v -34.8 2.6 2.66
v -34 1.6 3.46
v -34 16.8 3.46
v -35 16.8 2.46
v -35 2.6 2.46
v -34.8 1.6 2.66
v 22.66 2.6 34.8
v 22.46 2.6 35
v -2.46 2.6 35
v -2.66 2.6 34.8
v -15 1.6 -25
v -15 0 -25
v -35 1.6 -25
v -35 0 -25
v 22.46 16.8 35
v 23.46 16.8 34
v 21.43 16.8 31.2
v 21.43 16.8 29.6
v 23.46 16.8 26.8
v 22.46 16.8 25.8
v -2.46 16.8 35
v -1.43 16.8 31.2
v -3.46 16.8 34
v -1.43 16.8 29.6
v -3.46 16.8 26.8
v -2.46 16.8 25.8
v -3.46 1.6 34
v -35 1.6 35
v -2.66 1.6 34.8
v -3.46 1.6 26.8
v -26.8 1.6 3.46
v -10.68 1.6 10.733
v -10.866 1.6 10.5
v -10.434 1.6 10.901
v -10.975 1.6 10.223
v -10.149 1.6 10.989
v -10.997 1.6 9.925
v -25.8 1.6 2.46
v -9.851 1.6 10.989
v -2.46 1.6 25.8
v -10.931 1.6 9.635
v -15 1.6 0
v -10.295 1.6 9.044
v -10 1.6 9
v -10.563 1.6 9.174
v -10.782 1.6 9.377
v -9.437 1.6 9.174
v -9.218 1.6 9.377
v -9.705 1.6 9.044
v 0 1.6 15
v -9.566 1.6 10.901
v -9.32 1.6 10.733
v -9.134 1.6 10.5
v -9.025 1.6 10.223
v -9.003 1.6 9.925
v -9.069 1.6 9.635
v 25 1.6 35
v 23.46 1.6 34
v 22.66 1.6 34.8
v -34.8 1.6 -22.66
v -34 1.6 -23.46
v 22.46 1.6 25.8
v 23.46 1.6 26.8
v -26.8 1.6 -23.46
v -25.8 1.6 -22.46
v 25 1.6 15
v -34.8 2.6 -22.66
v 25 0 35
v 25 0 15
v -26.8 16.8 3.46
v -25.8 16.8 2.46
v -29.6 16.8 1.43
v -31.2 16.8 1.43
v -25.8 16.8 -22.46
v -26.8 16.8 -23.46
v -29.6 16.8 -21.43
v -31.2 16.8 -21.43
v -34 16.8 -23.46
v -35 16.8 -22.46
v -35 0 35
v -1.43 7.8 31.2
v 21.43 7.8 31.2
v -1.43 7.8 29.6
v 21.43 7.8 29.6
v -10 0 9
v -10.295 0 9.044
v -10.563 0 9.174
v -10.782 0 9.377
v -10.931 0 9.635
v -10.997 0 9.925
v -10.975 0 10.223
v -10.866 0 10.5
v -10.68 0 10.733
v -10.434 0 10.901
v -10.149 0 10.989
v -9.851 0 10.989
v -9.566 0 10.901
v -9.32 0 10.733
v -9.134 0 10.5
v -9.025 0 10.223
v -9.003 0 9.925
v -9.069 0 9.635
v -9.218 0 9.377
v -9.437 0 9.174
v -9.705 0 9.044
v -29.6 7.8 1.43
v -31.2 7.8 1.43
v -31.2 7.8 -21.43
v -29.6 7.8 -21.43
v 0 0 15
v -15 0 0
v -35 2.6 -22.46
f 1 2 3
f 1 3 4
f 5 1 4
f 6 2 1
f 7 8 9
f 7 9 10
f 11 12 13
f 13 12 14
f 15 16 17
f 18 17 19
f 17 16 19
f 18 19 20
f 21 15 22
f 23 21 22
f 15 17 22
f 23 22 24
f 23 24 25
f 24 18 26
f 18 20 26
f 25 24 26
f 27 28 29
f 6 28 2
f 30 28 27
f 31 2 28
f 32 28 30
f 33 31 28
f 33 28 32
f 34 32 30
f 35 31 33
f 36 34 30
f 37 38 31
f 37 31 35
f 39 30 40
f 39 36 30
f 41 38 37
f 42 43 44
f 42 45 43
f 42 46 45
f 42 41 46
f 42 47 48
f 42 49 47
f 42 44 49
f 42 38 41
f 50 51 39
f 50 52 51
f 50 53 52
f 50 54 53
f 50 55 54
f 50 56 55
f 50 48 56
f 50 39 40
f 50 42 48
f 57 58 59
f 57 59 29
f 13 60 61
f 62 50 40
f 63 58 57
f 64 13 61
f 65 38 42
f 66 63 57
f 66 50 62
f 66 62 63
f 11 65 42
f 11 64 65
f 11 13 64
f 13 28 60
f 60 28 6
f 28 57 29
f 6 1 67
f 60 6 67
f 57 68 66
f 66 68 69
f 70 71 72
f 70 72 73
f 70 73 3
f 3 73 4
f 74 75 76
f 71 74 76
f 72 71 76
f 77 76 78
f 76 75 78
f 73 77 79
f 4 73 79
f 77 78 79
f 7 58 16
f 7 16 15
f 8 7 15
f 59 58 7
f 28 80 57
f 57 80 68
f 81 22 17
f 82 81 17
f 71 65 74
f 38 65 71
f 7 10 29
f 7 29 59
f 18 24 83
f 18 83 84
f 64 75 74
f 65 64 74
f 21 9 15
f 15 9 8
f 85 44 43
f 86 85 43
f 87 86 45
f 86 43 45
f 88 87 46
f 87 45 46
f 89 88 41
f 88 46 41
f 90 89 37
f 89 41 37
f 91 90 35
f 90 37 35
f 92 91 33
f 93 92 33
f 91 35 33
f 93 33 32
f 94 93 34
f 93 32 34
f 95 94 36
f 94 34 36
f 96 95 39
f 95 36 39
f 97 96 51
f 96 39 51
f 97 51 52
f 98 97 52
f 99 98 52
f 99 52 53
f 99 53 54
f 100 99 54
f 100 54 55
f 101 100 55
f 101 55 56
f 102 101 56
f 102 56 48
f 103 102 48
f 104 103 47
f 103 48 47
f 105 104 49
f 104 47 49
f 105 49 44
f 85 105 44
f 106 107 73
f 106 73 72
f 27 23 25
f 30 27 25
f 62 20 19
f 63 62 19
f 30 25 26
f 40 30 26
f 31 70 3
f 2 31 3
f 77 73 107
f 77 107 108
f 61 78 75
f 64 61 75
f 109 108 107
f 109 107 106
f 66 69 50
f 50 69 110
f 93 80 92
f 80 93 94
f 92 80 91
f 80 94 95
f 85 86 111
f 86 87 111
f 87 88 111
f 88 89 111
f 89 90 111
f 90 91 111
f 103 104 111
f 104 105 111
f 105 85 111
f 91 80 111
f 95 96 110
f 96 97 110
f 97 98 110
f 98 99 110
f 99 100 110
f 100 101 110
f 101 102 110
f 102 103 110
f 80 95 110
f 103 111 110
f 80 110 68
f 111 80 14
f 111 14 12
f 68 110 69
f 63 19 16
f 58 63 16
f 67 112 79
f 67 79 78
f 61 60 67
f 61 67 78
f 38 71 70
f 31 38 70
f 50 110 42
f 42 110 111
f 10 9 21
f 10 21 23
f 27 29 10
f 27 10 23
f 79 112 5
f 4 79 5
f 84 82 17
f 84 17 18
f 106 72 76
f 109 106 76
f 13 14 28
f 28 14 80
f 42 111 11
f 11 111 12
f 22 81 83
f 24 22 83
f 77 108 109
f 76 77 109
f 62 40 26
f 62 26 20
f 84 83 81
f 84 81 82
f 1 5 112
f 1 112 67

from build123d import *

# Parameters (mm, degrees)
EXTRUDE_1_DEPTH     = 1.6
EXTRUDE_START       = 1.6
EXTRUDE_2_DEPTH     = 15.2
CUT_EXTRUDE_START   = 35
SKETCH_5_W          = 26.92
SKETCH_5_H          = 1
CUT_EXTRUDE_2_DEPTH = 0.2
CUT_EXTRUDE_START_2 = -35
SKETCH_6_W          = 26.92
SKETCH_6_H          = 1
CUT_EXTRUDE_3_DEPTH = 0.2
CUT_EXTRUDE_START_3 = 16.8
SKETCH_7_W          = 1.6
SKETCH_7_H          = 22.86
SKETCH_7_W_2        = 22.86
SKETCH_7_H_2        = 1.6
CUT_EXTRUDE_4_DEPTH = 9
CUT_EXTRUDE_START_4 = 1.6
SKETCH_8_R          = 1
CUT_EXTRUDE_5_DEPTH = 1.6


with BuildPart() as part:
    # 草图2 → 凸台-拉伸1 (new body)
    with BuildSketch(Plane(origin=(0, 0, 0), x_dir=(1, 0, 0), z_dir=(0, 1, 0))):
        Polygon((-15, 0), (-15, 25), (-35, 25), (-35, 0), (-35, -35), (0, -35), (25, -35), (25, -15), (0, -15), align=None)
    extrude(amount=EXTRUDE_1_DEPTH)

    # 草图3 → 凸台-拉伸2 (add)
    with BuildSketch(Plane(origin=(0, 0, 0), x_dir=(1, 0, 0), z_dir=(0, 1, 0)).offset(EXTRUDE_START)):
        Polygon((-34, -3.46), (-35, -2.46), (-35, 22.46), (-34, 23.46), (-26.8, 23.46), (-25.8, 22.46), (-25.8, -2.46), (-26.8, -3.46), align=None)
        Polygon((22.46, -35), (-2.46, -35), (-3.46, -34), (-3.46, -26.8), (-2.46, -25.8), (22.46, -25.8), (23.46, -26.8), (23.46, -34), align=None)
    extrude(amount=EXTRUDE_2_DEPTH)

    # 草图5 → 切除-拉伸2 (cut)
    with BuildSketch(Plane.XY.offset(CUT_EXTRUDE_START)):
        with Locations((10, 2.1)):
            Rectangle(SKETCH_5_W, SKETCH_5_H)
    extrude(amount=-CUT_EXTRUDE_2_DEPTH, mode=Mode.SUBTRACT)

    # 草图6 → 切除-拉伸3 (cut)
    with BuildSketch(Plane(origin=(0, 0, 0), x_dir=(0, 0, -1), z_dir=(1, 0, 0)).offset(CUT_EXTRUDE_START_2)):
        with Locations((10, 2.1)):
            Rectangle(SKETCH_6_W, SKETCH_6_H)
    extrude(amount=CUT_EXTRUDE_3_DEPTH, mode=Mode.SUBTRACT)

    # 草图7 → 切除-拉伸4 (cut)
    with BuildSketch(Plane(origin=(0, 0, 0), x_dir=(1, 0, 0), z_dir=(0, 1, 0)).offset(CUT_EXTRUDE_START_3)):
        with Locations((-30.4, 10)):
            Rectangle(SKETCH_7_W, SKETCH_7_H)
        with Locations((10, -30.4)):
            Rectangle(SKETCH_7_W_2, SKETCH_7_H_2)
    extrude(amount=-CUT_EXTRUDE_4_DEPTH, mode=Mode.SUBTRACT)

    # 草图8 → 切除-拉伸5 (cut)
    with BuildSketch(Plane(origin=(0, 0, 0), x_dir=(1, 0, 0), z_dir=(0, 1, 0)).offset(CUT_EXTRUDE_START_4)):
        with Locations(Location((-10, -10, 0), (0, 0, 90))):
            Circle(SKETCH_8_R)
    extrude(amount=-CUT_EXTRUDE_5_DEPTH, mode=Mode.SUBTRACT)


solid = part.part
